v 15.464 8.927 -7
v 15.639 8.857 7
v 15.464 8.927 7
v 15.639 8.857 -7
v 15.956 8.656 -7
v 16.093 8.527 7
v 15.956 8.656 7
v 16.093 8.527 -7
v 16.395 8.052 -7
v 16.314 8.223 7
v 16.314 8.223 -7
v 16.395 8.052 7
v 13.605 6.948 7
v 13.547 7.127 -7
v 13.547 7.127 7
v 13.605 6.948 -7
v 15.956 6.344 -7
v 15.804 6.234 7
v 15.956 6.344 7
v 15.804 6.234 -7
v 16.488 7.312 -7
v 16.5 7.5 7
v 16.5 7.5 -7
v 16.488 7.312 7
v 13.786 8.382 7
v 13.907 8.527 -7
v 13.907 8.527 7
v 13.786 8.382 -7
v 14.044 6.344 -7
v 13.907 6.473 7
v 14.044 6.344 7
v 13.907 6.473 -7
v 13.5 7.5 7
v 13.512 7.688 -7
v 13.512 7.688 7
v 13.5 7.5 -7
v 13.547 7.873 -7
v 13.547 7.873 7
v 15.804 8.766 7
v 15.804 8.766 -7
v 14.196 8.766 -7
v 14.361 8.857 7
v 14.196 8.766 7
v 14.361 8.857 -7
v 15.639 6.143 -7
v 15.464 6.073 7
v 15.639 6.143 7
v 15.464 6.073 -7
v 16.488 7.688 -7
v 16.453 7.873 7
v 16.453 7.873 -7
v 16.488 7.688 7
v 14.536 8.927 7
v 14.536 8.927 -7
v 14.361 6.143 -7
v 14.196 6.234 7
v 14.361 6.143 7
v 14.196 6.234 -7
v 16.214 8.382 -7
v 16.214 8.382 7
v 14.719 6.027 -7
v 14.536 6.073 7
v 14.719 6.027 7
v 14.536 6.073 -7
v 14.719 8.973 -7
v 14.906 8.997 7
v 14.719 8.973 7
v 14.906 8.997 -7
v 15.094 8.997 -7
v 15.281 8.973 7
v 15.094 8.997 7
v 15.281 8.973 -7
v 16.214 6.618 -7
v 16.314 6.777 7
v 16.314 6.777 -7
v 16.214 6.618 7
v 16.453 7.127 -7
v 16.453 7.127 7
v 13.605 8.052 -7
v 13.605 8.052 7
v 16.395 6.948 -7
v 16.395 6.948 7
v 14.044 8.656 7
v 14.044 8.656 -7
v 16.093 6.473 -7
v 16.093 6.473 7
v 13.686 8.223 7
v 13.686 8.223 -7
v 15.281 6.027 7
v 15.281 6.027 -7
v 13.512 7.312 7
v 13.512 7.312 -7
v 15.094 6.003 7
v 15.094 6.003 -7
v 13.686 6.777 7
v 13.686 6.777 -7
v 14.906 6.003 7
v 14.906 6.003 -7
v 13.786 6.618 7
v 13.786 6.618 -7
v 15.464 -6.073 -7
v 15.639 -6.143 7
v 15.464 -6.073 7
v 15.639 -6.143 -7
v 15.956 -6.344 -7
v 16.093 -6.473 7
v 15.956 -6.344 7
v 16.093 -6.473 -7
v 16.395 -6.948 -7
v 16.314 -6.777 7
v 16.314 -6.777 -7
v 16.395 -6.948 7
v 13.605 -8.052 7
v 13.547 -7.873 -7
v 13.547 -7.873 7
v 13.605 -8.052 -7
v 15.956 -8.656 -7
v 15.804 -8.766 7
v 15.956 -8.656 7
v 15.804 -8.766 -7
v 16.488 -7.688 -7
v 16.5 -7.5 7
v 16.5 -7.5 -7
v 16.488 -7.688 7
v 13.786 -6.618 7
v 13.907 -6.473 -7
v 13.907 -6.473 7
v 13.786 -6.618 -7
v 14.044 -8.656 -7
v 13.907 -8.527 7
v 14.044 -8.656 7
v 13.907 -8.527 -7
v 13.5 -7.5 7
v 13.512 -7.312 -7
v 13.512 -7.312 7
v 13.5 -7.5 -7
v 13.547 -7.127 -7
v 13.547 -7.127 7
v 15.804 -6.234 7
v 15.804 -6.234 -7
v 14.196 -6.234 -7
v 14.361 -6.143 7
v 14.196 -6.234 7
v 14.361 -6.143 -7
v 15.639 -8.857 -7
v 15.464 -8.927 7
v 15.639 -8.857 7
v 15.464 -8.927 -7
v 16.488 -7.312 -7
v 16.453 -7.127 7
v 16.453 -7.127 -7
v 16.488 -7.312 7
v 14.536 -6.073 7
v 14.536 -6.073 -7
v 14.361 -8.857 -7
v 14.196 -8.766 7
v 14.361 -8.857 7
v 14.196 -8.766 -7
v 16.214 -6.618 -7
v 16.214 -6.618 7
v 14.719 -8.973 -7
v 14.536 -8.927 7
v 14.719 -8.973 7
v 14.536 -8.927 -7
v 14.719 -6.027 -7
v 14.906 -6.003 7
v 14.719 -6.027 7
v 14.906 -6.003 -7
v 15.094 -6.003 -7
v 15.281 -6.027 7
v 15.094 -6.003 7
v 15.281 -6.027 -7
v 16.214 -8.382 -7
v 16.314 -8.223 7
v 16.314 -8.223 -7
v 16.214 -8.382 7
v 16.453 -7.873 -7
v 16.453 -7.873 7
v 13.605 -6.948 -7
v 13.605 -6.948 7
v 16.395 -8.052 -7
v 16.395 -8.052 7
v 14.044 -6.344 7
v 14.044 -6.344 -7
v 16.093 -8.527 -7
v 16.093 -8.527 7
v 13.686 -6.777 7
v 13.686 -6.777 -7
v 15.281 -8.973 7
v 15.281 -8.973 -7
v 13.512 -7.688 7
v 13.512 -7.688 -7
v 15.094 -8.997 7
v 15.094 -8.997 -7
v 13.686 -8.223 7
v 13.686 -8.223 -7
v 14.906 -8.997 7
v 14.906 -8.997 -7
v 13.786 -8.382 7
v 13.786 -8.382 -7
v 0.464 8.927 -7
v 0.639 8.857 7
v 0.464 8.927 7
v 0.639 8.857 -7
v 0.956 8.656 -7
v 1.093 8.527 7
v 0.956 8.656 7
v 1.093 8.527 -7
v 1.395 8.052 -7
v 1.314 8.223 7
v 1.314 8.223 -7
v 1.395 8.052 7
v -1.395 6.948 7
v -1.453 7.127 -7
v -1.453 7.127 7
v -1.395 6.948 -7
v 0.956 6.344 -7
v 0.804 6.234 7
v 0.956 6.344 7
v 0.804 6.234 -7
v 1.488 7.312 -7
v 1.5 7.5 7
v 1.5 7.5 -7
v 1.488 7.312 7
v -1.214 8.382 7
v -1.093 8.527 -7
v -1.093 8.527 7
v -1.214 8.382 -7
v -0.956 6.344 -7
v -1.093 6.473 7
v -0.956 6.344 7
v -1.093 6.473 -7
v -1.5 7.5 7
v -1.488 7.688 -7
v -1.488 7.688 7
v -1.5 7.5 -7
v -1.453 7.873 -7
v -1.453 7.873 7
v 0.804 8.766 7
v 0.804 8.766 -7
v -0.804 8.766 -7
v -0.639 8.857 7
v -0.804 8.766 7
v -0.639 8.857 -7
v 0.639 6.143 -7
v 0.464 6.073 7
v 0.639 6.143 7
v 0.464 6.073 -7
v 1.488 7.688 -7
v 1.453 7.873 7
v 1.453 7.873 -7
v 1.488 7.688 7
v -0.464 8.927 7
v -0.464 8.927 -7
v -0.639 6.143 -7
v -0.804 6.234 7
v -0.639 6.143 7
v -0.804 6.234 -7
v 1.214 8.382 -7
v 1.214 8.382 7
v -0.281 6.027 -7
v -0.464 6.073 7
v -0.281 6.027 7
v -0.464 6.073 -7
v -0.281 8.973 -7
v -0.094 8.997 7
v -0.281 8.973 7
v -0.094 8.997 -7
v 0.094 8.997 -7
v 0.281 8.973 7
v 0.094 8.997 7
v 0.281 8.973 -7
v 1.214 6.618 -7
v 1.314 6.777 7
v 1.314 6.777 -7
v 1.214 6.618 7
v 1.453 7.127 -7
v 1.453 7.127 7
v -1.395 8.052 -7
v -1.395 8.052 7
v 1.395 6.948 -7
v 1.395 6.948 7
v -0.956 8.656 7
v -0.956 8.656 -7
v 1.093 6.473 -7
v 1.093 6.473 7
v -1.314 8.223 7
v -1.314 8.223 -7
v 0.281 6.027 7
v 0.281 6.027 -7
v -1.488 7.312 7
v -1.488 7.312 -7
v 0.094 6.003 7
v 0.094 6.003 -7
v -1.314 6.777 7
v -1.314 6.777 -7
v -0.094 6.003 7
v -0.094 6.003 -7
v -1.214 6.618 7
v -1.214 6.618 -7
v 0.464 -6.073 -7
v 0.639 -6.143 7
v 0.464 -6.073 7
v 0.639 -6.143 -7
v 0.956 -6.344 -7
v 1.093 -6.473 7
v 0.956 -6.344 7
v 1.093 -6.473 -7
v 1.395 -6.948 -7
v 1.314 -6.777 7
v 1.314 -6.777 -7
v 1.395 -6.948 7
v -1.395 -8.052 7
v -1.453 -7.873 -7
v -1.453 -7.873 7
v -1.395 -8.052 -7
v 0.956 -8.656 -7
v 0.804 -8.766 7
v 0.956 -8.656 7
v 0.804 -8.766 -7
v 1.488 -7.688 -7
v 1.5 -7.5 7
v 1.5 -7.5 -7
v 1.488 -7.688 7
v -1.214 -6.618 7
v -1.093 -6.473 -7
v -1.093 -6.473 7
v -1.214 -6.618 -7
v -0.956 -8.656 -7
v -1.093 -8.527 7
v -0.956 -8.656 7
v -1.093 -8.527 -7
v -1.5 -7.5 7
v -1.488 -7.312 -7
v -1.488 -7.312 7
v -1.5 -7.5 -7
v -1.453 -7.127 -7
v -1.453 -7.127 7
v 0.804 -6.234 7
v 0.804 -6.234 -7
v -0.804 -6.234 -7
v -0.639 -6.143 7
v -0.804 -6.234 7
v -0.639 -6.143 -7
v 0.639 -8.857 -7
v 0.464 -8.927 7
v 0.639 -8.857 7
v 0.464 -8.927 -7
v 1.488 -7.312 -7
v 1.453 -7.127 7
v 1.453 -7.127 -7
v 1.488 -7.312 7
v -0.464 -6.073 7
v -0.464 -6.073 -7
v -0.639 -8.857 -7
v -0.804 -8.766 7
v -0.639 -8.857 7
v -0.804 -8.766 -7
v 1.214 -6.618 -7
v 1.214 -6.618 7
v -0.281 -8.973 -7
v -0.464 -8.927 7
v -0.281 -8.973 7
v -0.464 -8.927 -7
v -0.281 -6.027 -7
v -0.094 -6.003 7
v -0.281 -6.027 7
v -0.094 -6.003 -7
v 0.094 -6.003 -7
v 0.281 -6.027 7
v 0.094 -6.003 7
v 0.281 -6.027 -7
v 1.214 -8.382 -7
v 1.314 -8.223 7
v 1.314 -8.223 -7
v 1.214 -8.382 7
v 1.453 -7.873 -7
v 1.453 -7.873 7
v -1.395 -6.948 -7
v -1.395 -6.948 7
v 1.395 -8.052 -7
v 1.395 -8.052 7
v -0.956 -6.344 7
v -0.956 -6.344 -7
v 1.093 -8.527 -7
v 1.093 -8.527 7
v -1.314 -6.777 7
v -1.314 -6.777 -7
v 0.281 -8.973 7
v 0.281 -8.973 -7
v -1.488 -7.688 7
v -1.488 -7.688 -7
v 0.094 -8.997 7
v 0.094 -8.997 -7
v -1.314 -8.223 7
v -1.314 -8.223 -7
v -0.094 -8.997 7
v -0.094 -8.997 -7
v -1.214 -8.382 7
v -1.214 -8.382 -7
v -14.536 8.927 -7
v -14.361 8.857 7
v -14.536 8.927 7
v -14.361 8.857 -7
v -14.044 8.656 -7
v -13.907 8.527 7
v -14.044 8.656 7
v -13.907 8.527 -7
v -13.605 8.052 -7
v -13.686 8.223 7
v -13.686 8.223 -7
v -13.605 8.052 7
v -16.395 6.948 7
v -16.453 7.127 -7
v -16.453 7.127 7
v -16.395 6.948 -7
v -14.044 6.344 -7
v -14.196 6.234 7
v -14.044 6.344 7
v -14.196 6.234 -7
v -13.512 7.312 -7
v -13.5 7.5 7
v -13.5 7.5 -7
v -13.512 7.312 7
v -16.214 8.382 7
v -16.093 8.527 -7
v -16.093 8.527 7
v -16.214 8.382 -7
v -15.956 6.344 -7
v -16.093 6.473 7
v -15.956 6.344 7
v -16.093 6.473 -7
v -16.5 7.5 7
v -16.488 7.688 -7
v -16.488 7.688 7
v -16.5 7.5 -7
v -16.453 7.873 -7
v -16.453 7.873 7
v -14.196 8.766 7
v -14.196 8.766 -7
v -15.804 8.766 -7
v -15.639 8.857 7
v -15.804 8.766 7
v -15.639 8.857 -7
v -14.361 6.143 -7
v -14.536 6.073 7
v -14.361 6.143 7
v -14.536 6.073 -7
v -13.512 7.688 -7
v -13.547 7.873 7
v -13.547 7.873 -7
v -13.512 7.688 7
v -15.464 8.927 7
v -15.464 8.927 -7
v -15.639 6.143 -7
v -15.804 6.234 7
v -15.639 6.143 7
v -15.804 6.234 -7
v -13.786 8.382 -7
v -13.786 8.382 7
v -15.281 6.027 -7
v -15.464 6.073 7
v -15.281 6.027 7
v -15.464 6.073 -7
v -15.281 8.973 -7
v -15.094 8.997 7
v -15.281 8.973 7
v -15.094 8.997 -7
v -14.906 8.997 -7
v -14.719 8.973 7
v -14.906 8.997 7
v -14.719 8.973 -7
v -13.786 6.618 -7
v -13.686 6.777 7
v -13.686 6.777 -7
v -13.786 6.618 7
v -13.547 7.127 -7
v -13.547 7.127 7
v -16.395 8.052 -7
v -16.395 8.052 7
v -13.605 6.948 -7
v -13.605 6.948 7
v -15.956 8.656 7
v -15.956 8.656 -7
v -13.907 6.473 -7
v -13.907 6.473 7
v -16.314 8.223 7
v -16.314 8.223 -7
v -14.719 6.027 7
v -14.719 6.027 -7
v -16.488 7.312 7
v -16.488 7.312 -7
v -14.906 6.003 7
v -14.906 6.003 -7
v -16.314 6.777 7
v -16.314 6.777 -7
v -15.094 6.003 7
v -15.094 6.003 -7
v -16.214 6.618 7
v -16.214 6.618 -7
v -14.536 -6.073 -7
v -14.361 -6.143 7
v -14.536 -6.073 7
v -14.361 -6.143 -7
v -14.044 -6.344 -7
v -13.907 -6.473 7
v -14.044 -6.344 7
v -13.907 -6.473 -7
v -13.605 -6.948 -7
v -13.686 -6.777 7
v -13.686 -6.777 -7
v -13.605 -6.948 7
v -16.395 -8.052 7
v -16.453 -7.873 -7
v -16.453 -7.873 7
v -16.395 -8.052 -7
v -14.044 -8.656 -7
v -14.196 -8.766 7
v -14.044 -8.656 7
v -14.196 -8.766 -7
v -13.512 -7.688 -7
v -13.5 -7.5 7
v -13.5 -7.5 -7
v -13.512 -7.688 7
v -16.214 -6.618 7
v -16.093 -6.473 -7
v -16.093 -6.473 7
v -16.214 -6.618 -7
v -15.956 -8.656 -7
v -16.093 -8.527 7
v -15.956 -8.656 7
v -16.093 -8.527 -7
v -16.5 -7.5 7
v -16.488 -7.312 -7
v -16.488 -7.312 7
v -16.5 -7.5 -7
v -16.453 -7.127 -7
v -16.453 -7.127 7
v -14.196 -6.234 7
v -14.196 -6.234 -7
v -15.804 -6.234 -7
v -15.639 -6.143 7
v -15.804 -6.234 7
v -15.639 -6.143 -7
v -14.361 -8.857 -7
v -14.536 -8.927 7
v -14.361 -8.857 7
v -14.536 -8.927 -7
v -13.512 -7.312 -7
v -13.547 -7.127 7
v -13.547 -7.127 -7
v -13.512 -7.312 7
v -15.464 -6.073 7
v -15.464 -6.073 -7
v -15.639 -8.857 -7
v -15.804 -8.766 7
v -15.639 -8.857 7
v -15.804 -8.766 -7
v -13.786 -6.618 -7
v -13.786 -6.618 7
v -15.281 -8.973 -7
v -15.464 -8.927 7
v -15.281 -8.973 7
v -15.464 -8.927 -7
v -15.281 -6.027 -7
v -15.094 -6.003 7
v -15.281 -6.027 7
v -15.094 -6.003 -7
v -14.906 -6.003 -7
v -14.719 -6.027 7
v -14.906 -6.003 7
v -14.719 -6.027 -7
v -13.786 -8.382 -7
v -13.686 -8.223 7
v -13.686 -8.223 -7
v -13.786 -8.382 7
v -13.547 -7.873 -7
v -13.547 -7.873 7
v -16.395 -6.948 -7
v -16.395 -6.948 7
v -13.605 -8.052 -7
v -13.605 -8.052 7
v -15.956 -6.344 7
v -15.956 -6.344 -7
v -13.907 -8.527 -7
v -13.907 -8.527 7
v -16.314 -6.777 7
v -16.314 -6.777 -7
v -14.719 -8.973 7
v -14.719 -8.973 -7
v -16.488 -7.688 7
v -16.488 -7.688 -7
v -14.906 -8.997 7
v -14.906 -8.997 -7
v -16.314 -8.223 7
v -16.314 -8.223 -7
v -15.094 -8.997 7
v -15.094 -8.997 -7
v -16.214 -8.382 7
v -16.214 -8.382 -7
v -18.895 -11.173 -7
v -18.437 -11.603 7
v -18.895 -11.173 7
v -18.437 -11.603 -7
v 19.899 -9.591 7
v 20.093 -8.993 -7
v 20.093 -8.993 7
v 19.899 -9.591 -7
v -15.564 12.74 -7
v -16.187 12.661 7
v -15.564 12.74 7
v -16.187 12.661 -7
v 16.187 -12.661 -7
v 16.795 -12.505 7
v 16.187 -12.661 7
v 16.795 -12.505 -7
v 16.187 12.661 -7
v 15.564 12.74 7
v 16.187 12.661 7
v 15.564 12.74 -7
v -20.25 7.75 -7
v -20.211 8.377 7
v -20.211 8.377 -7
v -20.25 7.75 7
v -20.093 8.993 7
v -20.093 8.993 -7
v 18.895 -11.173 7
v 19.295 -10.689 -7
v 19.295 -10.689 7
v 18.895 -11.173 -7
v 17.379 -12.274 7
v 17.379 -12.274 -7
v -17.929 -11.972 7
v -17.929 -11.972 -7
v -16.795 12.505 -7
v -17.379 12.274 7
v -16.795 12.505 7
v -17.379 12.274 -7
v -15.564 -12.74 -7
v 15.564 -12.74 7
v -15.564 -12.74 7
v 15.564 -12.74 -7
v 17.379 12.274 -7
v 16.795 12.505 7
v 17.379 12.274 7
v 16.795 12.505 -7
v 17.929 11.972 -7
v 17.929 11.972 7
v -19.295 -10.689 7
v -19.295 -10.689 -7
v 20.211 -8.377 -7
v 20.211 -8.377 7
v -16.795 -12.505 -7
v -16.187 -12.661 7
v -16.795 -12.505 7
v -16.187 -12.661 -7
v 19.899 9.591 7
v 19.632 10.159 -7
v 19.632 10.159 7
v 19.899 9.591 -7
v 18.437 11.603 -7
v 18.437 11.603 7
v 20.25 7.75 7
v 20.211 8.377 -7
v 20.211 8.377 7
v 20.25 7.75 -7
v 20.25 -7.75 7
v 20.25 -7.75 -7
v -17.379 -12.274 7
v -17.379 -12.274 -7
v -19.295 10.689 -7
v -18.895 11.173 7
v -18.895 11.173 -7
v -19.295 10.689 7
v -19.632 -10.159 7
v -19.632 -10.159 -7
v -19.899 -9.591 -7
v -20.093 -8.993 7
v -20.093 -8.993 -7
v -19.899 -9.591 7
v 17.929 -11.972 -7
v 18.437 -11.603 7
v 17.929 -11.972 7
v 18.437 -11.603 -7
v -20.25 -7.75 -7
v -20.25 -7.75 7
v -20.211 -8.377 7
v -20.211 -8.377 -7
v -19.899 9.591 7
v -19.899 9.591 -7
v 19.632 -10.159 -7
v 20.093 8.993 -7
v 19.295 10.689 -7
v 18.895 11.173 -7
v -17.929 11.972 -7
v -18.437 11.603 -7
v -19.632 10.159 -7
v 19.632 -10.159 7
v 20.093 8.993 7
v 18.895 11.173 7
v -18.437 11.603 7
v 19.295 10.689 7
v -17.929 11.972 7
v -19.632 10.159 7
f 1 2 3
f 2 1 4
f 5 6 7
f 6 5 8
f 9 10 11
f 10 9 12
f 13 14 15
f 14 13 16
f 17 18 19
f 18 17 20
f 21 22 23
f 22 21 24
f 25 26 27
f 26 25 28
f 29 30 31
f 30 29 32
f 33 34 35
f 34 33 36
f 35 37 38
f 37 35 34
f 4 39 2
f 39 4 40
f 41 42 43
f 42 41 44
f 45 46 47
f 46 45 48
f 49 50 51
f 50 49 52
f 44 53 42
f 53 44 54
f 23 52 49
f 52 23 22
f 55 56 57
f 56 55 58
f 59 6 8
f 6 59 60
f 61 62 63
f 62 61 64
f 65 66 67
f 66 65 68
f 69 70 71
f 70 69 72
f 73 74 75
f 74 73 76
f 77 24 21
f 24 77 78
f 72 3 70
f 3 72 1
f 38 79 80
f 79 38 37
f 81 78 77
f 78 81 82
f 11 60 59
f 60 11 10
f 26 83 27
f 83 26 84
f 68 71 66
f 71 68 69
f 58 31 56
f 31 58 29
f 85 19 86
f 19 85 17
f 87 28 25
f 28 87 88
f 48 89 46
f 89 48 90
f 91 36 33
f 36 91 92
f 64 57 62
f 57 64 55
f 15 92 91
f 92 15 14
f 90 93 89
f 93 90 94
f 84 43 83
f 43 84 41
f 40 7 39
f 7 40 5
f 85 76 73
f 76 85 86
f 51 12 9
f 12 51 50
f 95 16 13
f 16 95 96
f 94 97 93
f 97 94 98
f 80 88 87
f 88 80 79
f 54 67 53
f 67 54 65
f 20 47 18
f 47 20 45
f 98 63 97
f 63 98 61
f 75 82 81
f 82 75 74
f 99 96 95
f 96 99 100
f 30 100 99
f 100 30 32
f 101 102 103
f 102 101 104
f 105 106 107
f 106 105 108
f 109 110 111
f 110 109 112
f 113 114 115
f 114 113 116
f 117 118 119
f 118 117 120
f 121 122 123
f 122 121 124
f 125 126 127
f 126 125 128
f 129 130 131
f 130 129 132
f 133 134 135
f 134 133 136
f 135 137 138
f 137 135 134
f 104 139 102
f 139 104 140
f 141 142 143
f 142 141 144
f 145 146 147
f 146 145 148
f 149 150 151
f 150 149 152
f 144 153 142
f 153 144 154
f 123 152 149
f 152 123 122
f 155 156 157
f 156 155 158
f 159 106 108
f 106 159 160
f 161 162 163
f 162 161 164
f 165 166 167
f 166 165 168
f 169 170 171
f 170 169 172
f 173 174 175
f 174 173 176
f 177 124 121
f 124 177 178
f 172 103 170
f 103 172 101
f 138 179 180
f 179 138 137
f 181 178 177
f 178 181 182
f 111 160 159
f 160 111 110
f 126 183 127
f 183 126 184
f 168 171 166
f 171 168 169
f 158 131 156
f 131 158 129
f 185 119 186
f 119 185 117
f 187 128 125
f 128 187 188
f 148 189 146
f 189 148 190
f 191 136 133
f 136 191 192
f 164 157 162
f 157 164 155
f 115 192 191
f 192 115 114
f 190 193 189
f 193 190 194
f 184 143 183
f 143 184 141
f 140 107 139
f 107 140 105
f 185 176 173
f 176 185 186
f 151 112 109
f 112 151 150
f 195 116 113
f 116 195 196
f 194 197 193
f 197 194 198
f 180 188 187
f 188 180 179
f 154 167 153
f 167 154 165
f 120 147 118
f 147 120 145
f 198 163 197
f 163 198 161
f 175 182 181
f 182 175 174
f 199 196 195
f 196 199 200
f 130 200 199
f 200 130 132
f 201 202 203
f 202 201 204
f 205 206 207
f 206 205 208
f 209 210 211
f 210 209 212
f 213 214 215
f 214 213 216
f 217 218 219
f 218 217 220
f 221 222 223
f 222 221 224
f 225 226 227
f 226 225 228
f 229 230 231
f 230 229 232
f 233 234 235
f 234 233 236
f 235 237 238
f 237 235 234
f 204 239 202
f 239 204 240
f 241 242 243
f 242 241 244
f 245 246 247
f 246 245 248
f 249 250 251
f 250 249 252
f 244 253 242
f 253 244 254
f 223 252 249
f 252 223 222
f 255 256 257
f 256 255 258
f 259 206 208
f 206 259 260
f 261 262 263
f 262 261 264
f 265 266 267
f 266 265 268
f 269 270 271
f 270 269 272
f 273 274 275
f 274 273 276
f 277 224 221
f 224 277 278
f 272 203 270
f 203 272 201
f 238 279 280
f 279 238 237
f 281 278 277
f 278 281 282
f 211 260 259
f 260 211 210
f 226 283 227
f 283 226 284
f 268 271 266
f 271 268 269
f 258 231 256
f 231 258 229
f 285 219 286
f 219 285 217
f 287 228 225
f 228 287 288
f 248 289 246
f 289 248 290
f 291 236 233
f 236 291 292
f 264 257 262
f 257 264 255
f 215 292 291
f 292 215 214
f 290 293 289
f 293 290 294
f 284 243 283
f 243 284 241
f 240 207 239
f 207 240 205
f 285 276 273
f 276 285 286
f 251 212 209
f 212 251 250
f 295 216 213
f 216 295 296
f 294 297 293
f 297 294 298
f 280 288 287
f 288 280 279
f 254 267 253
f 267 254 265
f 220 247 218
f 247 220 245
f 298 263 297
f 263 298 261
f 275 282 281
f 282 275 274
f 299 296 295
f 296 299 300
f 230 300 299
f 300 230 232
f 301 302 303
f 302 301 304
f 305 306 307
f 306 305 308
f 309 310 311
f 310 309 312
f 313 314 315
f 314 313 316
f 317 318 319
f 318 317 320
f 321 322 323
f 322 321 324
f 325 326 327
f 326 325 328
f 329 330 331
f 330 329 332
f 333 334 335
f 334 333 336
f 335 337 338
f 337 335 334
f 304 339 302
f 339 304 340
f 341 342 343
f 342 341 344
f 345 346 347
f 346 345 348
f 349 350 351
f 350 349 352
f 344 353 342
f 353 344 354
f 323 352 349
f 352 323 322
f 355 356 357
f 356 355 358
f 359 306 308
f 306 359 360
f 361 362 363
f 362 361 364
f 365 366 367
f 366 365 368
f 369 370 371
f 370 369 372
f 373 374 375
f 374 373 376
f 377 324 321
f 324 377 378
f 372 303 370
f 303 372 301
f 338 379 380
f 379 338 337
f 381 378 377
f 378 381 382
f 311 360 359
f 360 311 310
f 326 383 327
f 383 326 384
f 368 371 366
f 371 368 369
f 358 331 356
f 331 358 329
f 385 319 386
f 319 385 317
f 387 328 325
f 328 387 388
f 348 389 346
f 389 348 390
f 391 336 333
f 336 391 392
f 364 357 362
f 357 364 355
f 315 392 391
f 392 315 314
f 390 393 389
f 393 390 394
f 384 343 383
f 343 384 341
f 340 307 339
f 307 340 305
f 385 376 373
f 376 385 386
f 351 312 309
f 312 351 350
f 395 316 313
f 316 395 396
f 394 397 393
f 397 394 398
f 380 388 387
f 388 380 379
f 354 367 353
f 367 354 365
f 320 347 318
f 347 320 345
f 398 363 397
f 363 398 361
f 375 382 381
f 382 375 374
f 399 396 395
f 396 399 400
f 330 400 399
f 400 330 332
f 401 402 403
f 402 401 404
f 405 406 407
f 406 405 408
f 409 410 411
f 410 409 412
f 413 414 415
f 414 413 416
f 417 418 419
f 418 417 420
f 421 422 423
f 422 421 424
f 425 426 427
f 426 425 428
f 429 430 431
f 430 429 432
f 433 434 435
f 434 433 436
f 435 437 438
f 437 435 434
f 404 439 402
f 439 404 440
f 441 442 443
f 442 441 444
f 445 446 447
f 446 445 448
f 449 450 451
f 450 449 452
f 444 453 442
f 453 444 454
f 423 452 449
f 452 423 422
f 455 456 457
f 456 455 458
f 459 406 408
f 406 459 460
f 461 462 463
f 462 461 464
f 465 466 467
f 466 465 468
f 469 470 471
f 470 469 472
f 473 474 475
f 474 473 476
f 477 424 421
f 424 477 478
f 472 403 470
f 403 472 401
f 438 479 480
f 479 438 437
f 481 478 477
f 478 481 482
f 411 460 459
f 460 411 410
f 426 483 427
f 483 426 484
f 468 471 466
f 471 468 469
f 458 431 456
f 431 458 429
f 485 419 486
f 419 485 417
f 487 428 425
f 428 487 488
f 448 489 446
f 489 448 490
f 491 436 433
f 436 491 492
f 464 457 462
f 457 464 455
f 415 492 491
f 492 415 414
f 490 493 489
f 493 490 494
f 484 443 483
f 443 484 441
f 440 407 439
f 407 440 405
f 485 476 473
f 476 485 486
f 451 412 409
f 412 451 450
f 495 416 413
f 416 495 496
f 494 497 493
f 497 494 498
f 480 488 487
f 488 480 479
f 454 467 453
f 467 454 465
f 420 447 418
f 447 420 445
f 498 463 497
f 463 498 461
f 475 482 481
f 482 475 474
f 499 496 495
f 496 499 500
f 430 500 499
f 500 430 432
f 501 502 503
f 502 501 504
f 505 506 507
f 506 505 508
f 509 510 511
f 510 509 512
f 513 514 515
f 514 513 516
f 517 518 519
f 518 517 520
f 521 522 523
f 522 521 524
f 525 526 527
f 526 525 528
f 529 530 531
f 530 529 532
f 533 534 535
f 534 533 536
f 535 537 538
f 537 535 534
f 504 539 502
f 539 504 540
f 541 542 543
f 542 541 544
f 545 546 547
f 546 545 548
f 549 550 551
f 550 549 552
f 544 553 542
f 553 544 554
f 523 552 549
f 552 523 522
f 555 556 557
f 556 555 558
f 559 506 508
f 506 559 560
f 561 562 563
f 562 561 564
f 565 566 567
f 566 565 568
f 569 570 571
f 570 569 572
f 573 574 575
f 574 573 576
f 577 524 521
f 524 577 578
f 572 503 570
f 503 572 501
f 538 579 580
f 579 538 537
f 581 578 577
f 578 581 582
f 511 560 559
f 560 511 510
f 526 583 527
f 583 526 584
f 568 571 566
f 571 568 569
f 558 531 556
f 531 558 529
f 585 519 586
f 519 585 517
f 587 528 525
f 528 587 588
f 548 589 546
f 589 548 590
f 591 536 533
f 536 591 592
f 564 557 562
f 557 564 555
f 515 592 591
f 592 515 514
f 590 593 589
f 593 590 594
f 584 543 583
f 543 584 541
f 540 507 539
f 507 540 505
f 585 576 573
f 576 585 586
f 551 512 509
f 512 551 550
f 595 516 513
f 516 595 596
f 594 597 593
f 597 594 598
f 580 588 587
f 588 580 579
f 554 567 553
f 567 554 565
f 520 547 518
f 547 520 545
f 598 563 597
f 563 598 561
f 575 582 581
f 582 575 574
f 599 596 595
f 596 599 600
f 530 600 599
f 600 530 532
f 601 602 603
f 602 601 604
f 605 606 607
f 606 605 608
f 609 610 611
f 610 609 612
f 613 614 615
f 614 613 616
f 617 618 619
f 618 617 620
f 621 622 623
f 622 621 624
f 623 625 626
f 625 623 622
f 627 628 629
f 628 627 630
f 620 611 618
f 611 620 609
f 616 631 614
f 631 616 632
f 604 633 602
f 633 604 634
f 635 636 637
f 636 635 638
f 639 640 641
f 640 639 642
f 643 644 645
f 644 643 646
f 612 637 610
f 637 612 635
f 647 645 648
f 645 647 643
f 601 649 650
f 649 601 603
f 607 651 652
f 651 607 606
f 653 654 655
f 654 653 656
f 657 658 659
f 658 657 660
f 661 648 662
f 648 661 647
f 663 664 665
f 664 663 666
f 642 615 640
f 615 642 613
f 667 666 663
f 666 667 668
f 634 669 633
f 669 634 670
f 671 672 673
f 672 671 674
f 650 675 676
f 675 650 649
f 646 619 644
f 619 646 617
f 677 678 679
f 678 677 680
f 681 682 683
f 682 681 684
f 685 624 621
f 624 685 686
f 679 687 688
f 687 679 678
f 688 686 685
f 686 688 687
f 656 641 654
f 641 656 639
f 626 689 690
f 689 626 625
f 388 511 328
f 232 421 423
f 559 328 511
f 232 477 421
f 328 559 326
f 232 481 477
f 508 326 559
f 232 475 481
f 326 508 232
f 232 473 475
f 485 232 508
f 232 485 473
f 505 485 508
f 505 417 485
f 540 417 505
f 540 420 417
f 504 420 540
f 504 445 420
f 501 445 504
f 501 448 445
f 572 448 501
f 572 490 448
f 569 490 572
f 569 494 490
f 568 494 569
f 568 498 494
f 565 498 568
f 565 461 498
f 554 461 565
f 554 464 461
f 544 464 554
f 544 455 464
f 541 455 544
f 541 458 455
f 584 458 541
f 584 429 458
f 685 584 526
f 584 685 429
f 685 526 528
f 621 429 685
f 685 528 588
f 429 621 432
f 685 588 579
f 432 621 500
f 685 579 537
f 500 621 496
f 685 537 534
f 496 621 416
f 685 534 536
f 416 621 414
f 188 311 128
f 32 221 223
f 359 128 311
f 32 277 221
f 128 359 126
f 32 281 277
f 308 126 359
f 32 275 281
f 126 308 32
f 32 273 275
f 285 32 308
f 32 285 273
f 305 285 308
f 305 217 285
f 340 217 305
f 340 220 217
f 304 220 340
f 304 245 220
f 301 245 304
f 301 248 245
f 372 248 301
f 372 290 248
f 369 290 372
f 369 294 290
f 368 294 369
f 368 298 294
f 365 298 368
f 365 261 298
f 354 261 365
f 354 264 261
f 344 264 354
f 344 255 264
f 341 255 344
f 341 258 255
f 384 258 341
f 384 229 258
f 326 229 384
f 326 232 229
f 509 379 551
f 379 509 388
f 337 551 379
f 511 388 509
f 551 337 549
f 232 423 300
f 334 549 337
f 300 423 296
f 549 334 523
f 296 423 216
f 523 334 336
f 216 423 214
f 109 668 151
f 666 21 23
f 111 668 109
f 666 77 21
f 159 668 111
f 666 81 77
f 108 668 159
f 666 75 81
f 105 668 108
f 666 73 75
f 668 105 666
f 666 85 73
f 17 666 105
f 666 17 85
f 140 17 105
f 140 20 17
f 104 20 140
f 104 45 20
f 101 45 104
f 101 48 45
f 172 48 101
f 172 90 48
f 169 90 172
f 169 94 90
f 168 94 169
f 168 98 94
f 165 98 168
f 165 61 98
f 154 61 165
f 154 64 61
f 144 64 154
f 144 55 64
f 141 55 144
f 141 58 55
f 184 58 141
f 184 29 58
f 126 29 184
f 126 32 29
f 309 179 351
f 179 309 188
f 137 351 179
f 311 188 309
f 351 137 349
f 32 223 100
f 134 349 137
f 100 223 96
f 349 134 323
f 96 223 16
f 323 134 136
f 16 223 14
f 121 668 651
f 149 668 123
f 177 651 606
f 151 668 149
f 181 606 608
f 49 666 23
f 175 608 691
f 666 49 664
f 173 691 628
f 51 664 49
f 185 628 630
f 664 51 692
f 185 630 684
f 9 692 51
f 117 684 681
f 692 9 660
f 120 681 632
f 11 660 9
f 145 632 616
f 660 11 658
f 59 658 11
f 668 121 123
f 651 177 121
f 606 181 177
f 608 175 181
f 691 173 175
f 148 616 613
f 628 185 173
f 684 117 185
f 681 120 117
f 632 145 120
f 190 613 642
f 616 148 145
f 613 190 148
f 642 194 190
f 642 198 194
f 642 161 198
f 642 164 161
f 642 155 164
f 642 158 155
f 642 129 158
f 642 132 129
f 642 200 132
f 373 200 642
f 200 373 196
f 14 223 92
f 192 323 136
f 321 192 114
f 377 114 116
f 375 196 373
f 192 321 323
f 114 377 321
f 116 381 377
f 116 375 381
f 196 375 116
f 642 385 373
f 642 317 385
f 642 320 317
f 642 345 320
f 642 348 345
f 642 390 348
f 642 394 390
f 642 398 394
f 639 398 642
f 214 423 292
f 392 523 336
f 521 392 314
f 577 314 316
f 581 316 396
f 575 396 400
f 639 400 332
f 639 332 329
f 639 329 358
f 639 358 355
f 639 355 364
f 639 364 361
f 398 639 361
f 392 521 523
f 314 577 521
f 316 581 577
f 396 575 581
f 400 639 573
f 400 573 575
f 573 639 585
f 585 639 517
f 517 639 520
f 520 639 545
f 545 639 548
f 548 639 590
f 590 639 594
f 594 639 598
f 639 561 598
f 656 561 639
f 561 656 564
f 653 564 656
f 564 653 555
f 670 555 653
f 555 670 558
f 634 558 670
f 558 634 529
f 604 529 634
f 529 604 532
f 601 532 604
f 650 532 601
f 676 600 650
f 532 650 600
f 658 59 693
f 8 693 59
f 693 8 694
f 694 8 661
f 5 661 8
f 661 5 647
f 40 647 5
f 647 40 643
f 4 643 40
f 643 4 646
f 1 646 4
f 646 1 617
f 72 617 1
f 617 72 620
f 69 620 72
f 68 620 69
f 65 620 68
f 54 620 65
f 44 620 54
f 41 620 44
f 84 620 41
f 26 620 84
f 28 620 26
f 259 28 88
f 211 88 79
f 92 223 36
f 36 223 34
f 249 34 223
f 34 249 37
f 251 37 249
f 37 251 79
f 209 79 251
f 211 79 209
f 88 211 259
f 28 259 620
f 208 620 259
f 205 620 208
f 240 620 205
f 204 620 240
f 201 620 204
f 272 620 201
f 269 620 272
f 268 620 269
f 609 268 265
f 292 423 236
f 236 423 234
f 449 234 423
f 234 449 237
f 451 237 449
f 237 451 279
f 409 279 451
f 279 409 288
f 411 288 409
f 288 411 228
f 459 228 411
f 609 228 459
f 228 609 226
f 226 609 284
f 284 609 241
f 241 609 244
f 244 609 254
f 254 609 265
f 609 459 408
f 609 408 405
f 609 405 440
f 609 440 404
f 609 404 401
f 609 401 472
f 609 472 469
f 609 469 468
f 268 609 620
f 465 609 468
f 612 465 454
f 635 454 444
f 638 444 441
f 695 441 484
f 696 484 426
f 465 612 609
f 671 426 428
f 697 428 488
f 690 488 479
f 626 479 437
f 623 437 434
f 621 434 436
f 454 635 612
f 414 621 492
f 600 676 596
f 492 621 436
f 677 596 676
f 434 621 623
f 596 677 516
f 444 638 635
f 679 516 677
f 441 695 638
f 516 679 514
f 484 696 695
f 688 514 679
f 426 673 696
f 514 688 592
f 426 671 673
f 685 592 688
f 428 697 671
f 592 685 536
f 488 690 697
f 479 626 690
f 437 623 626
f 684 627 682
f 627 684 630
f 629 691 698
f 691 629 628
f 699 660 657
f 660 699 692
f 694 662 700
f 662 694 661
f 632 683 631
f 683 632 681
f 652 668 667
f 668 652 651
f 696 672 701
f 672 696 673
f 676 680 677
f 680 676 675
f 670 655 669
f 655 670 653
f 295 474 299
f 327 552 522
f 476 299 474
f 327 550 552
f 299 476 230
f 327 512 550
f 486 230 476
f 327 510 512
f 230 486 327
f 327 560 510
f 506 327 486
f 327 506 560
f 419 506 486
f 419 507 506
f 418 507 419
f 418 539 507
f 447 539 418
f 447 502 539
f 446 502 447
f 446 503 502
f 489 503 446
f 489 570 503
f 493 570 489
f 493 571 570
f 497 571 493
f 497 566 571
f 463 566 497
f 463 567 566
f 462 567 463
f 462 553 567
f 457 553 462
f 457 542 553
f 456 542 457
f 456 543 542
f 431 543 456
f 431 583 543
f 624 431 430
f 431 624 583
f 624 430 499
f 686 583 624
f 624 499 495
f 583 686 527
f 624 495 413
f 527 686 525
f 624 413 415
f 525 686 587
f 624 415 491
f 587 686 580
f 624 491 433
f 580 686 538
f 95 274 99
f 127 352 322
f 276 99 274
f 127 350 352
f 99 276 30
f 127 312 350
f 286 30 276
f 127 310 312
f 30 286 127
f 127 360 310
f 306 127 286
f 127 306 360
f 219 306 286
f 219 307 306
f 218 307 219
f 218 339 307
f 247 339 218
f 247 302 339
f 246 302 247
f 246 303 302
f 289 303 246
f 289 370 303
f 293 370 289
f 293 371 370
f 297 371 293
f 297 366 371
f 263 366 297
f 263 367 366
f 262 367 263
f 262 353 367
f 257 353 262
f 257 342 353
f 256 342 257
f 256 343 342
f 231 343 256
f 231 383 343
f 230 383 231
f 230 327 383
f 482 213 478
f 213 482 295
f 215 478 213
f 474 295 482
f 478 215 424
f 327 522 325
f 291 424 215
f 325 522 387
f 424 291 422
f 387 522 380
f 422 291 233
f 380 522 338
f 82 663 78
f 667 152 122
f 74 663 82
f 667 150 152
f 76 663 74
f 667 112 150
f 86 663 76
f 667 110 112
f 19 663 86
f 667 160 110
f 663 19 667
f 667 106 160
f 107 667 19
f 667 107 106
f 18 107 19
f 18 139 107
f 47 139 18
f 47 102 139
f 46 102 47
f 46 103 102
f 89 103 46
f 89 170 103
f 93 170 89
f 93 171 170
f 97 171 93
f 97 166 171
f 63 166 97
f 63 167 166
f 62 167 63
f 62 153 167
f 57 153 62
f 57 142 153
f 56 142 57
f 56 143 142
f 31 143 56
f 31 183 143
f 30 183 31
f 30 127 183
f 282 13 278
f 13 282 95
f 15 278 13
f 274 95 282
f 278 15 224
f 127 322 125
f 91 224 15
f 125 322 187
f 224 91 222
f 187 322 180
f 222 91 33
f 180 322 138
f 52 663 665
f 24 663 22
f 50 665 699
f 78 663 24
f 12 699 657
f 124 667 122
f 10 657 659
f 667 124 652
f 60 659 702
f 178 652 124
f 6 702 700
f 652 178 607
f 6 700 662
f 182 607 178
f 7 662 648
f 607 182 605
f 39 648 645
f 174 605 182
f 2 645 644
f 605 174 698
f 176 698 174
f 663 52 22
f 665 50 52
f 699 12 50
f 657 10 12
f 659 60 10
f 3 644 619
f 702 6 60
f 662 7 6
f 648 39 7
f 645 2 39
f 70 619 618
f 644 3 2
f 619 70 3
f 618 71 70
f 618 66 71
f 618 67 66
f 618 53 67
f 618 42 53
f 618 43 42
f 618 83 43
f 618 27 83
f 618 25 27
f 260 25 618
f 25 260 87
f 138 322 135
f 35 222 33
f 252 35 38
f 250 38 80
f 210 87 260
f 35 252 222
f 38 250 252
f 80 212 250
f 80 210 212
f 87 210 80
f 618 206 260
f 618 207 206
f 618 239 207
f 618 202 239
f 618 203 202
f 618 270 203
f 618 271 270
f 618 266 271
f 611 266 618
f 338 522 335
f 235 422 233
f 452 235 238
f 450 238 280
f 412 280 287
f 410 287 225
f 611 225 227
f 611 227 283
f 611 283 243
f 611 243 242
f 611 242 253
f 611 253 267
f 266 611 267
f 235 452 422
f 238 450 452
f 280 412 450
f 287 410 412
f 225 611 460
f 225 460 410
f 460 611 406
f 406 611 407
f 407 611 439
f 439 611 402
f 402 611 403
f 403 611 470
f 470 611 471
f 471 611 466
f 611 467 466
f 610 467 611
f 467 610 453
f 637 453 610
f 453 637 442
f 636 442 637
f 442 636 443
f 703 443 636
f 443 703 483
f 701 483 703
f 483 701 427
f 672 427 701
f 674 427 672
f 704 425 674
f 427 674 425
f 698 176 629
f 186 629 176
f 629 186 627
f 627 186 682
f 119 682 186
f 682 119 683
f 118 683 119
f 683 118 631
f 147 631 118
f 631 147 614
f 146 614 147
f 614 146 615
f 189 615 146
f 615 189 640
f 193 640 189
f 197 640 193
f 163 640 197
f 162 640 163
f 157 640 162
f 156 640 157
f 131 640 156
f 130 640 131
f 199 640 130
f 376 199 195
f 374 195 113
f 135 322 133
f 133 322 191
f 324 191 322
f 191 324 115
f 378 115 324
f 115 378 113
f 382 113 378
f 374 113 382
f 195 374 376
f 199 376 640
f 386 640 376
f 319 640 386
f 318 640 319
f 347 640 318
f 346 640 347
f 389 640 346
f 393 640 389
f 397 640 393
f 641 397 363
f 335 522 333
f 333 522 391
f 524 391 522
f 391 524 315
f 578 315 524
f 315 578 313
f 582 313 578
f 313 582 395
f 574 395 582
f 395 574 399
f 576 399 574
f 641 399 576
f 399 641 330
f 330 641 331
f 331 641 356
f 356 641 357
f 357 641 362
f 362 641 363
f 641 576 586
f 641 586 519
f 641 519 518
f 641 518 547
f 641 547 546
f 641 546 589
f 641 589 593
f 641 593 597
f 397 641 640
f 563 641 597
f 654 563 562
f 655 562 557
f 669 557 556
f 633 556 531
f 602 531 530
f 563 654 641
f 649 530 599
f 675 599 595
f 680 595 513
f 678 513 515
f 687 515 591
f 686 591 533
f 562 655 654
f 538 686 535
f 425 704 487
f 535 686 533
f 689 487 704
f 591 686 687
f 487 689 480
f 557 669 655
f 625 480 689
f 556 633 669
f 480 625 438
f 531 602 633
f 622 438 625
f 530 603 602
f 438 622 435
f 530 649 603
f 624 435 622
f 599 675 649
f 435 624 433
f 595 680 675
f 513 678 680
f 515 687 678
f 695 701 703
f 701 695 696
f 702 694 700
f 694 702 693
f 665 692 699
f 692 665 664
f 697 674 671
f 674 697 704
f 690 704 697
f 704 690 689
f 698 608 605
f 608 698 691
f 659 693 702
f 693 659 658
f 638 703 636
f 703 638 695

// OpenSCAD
$fn = 50;


difference() {
	union() {
		translate(v = [0, 0, -7.0000000000]) {
			hull() {
				translate(v = [-15.2500000000, 7.7500000000, 0]) {
					cylinder(h = 14, r = 5);
				}
				translate(v = [15.2500000000, 7.7500000000, 0]) {
					cylinder(h = 14, r = 5);
				}
				translate(v = [-15.2500000000, -7.7500000000, 0]) {
					cylinder(h = 14, r = 5);
				}
				translate(v = [15.2500000000, -7.7500000000, 0]) {
					cylinder(h = 14, r = 5);
				}
			}
		}
	}
	union() {
		translate(v = [15, 7.5000000000, 0]) {
			rotate(a = [0, 0, 0]) {
				difference() {
					union() {
						translate(v = [0, 0, -50.0000000000]) {
							cylinder(h = 100, r = 1.5000000000);
						}
					}
					union();
				}
			}
		}
		translate(v = [15, -7.5000000000, 0]) {
			rotate(a = [0, 0, 0]) {
				difference() {
					union() {
						translate(v = [0, 0, -50.0000000000]) {
							cylinder(h = 100, r = 1.5000000000);
						}
					}
					union();
				}
			}
		}
		translate(v = [0, 7.5000000000, 0]) {
			rotate(a = [0, 0, 0]) {
				difference() {
					union() {
						translate(v = [0, 0, -50.0000000000]) {
							cylinder(h = 100, r = 1.5000000000);
						}
					}
					union();
				}
			}
		}
		translate(v = [0, -7.5000000000, 0]) {
			rotate(a = [0, 0, 0]) {
				difference() {
					union() {
						translate(v = [0, 0, -50.0000000000]) {
							cylinder(h = 100, r = 1.5000000000);
						}
					}
					union();
				}
			}
		}
		translate(v = [-15, 7.5000000000, 0]) {
			rotate(a = [0, 0, 0]) {
				difference() {
					union() {
						translate(v = [0, 0, -50.0000000000]) {
							cylinder(h = 100, r = 1.5000000000);
						}
					}
					union();
				}
			}
		}
		translate(v = [-15, -7.5000000000, 0]) {
			rotate(a = [0, 0, 0]) {
				difference() {
					union() {
						translate(v = [0, 0, -50.0000000000]) {
							cylinder(h = 100, r = 1.5000000000);
						}
					}
					union();
				}
			}
		}
	}
}
